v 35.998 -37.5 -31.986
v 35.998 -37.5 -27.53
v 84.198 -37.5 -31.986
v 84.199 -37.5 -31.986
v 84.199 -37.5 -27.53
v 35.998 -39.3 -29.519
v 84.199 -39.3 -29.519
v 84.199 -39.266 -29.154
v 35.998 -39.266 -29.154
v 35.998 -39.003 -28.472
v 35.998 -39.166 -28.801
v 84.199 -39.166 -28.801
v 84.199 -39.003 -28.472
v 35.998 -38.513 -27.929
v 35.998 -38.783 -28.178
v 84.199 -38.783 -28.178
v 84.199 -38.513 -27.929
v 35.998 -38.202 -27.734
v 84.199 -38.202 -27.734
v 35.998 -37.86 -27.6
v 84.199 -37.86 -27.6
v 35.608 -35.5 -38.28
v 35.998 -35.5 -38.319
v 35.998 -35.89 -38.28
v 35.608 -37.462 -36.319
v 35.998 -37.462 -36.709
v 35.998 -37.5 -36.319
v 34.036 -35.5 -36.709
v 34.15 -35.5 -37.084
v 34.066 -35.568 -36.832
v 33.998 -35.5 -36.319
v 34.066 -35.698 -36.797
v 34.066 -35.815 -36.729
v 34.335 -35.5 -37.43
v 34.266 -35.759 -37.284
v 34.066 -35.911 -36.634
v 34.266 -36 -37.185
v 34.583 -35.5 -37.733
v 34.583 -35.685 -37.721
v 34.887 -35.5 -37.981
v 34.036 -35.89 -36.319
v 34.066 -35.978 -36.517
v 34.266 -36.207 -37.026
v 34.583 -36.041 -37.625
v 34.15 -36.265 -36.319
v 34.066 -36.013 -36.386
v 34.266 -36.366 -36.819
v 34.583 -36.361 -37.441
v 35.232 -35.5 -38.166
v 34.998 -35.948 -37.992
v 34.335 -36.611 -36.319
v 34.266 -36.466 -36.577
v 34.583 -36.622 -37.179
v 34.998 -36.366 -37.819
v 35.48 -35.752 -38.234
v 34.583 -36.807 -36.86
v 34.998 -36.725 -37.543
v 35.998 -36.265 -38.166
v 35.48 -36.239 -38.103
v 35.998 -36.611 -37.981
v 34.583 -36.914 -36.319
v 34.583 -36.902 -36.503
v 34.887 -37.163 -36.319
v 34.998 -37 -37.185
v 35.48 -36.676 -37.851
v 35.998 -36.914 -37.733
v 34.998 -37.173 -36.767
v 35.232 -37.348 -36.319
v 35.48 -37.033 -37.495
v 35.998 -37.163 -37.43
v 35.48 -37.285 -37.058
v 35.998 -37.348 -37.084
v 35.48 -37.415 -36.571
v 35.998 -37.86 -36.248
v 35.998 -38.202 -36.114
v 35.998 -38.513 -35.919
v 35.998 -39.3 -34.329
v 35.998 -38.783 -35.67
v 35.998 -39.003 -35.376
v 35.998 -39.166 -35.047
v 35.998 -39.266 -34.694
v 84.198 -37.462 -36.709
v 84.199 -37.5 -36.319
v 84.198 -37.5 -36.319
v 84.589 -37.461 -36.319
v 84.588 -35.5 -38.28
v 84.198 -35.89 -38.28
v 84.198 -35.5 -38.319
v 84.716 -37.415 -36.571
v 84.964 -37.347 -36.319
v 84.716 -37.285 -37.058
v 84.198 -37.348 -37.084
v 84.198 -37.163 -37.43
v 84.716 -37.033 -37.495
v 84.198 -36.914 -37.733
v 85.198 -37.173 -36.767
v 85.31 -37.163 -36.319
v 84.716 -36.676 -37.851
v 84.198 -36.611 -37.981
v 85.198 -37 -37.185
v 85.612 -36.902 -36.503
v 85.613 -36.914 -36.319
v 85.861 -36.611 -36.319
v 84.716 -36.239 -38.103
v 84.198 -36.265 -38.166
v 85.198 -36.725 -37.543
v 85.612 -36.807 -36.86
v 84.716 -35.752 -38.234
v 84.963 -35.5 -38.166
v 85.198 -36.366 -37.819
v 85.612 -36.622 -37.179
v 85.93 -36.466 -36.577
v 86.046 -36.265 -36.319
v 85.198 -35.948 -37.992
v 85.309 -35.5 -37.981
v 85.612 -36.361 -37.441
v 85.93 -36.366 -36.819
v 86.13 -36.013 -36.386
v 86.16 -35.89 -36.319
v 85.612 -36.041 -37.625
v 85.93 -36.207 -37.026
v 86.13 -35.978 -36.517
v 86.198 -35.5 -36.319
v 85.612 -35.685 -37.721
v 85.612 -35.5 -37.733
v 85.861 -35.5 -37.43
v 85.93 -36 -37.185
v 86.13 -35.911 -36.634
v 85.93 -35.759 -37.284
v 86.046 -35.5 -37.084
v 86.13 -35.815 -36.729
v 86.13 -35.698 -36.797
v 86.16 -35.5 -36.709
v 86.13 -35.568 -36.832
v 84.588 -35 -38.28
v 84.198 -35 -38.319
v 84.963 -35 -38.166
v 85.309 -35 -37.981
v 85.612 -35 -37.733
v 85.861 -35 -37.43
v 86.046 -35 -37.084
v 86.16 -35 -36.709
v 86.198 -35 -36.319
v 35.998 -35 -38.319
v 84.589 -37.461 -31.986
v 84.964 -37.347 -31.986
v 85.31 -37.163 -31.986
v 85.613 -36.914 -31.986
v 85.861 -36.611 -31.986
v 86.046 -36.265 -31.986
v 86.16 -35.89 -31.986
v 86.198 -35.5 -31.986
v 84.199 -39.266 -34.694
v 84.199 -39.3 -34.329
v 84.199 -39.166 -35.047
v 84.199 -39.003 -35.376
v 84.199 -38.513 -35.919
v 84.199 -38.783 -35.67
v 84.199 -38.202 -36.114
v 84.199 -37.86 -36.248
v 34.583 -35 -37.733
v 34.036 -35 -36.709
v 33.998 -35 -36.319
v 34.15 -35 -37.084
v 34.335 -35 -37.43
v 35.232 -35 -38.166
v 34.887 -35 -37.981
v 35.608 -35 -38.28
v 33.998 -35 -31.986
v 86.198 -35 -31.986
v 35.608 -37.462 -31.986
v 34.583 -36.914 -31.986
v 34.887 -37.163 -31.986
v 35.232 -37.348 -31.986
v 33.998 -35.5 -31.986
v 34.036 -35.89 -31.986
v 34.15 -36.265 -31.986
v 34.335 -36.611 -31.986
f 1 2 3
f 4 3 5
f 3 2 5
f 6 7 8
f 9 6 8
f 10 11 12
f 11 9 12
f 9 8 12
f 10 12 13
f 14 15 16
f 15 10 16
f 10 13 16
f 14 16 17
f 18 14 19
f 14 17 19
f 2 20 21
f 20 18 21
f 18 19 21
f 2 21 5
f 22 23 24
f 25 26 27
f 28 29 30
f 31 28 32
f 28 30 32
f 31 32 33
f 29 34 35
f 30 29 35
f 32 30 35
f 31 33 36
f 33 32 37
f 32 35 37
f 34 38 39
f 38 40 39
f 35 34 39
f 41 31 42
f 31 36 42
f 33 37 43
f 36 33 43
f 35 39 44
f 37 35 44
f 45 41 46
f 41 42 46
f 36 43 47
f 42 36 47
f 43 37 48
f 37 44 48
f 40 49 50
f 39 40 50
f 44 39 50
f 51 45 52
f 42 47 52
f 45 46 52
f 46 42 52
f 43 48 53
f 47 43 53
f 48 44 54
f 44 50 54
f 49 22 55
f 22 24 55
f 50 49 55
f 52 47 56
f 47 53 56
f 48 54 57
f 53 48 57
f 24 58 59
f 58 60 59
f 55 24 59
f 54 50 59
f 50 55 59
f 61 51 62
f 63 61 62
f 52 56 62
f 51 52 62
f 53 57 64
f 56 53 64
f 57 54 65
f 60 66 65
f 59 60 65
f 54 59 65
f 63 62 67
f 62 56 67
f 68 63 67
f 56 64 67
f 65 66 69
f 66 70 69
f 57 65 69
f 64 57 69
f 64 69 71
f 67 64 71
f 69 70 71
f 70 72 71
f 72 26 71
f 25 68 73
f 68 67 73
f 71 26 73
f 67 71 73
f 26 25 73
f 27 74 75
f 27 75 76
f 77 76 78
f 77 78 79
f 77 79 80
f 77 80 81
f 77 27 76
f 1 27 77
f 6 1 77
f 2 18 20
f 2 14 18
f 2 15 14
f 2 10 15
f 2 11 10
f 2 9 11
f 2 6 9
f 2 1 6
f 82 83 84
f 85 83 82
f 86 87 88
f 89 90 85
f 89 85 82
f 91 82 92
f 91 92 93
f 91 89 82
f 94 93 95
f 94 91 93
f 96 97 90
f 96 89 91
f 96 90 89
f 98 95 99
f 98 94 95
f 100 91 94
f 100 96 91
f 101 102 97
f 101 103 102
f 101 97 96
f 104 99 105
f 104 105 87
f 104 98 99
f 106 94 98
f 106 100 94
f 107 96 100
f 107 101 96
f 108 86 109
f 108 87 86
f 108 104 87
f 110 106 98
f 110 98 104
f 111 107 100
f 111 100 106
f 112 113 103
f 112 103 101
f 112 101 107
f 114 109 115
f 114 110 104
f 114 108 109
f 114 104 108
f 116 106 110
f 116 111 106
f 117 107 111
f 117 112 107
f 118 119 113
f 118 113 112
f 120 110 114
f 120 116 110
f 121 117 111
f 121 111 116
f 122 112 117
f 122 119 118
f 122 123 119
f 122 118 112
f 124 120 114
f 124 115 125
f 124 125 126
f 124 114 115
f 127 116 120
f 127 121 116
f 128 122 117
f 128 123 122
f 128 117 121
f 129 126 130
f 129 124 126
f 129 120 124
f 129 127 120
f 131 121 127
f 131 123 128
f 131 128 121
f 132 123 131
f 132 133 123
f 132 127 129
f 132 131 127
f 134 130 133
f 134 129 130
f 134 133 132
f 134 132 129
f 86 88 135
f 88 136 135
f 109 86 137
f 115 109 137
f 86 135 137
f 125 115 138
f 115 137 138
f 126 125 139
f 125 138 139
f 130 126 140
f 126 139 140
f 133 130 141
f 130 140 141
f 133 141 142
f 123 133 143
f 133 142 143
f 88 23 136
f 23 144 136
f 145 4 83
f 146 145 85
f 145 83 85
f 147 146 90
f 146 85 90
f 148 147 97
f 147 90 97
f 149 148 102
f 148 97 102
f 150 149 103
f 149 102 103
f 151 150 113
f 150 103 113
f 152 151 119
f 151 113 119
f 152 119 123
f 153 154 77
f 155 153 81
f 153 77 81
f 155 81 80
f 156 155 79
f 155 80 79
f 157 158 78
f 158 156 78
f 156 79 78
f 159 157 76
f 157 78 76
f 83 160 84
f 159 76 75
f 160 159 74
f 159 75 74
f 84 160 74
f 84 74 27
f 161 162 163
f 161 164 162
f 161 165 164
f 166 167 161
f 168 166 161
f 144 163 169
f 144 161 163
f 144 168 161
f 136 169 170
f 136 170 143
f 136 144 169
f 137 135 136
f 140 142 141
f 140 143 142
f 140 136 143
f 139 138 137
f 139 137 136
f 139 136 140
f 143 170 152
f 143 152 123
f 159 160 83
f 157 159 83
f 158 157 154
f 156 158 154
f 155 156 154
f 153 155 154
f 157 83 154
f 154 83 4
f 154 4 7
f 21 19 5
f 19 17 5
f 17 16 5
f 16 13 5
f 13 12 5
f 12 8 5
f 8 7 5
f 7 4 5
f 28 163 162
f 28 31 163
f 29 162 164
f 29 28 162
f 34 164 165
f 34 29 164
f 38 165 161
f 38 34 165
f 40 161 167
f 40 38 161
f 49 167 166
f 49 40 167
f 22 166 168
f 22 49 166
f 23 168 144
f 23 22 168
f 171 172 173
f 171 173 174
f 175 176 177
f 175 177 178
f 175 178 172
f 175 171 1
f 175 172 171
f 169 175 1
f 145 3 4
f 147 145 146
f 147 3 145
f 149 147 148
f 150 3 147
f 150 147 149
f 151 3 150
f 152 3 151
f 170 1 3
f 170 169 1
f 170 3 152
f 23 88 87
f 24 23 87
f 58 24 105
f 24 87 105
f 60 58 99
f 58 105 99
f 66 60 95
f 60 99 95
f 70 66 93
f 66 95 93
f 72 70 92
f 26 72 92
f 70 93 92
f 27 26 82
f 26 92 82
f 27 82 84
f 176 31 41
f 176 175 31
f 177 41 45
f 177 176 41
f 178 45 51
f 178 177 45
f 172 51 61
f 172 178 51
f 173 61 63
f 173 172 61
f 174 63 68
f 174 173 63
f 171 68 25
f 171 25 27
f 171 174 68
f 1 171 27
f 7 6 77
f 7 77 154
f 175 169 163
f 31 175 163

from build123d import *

# Parameters (mm, degrees)
SKETCH1_W           = 52.200247598
SKETCH1_H           = 6.332152384
BOSS_EXTRUDE1_DEPTH = 2.5
FILLET1_R           = 2
FILLET2_R           = 2
SKETCH4_W           = 48.201423078
SKETCH4_H           = 8.78902621
BOSS_EXTRUDE2_DEPTH = 1.8
FILLET3_R           = 2
FILLET4_R           = 2


with BuildPart() as part:
    # Sketch1 → Boss-Extrude1 (new body)
    with BuildSketch(Plane(origin=(0, -35, 0), x_dir=(1, 0, 0), z_dir=(0, 1, 0))):
        with Locations((60.097811714, 35.152469917)):
            Rectangle(SKETCH1_W, SKETCH1_H)
    extrude(amount=-BOSS_EXTRUDE1_DEPTH)

    # Fillet1
    fillet1_edges = [part.edges().sort_by_distance(p)[0] for p in [
        (60.097811714, -37.5, -38.318546109),
    ]]
    fillet(fillet1_edges, radius=FILLET1_R)

    # Fillet2
    fillet2_edges = [part.edges().sort_by_distance(p)[0] for p in [
        (86.197935513, -37.5, -34.152469917),
        (86.197935513, -35.25, -38.318546109),
        (33.997687915, -35.25, -38.318546109),
        (33.997687915, -37.5, -34.152469917),
        (33.997687915, -36.914213562, -37.732759671),
        (86.197935513, -36.914213562, -37.732759671),
    ]]
    fillet(fillet2_edges, radius=FILLET2_R)


with BuildPart() as boss_extrude2_tool:
    # Sketch4 → Boss-Extrude2 (new body)
    with BuildSketch(Plane.XZ.offset(37.5)):
        with Locations((60.098399454, -31.924033004)):
            Rectangle(SKETCH4_W, SKETCH4_H)
    extrude(amount=BOSS_EXTRUDE2_DEPTH)


with BuildPart() as part_1:
    add(part.part)


with BuildPart() as part_2:
    # Boss-Extrude2: joined with boss_extrude2_tool
    add(part_1.part.fuse(boss_extrude2_tool.part, tol=0.00001))

    # Fillet3
    # the kernel refuses this fillet: 2 mm, written as the material it takes off along each edge
    with BuildSketch(Plane(origin=(89.174048179, -39.3, -27.529519899), x_dir=(0, 0, -1), z_dir=(-1, 0, 0))) as fillet3_piece_1:
        with BuildLine():
            CenterArc((1.989974874, -2), FILLET3_R, 90, 84.260829523)
            Line((0, -1.8), (-0.039799497, -1.796))
            ThreePointArc((-0.039799497, -1.796), (-0.04, -0.9), (-0.04, 0))
            Line((-0.04, 0), (0, 0.04))
            Line((0, 0.04), (1.989974874, 0.04))
            Line((1.989974874, 0.04), (1.989974874, 0))
        make_face()
    extrude(amount=58.151297449, mode=Mode.SUBTRACT)

    # Fillet4
    # the kernel refuses this fillet: 2 mm, written as the material it takes off along each edge
    with BuildSketch(Plane(origin=(31.02275073, -39.3, -36.318546109), x_dir=(0, 1, 0), z_dir=(1, 0, 0))) as fillet4_piece_1:
        with BuildLine():
            CenterArc((2, 1.989974874), FILLET4_R, 180, 84.260829523)
            Line((0, 1.989974874), (-0.04, 1.989974874))
            Line((-0.04, 1.989974874), (-0.04, 0))
            Line((-0.04, 0), (0, -0.04))
            ThreePointArc((0, -0.04), (0.9, -0.04), (1.796, -0.039799497))
            Line((1.796, -0.039799497), (1.8, 0))
        make_face()
    extrude(amount=58.151297449, mode=Mode.SUBTRACT)


solid = part_2.part
